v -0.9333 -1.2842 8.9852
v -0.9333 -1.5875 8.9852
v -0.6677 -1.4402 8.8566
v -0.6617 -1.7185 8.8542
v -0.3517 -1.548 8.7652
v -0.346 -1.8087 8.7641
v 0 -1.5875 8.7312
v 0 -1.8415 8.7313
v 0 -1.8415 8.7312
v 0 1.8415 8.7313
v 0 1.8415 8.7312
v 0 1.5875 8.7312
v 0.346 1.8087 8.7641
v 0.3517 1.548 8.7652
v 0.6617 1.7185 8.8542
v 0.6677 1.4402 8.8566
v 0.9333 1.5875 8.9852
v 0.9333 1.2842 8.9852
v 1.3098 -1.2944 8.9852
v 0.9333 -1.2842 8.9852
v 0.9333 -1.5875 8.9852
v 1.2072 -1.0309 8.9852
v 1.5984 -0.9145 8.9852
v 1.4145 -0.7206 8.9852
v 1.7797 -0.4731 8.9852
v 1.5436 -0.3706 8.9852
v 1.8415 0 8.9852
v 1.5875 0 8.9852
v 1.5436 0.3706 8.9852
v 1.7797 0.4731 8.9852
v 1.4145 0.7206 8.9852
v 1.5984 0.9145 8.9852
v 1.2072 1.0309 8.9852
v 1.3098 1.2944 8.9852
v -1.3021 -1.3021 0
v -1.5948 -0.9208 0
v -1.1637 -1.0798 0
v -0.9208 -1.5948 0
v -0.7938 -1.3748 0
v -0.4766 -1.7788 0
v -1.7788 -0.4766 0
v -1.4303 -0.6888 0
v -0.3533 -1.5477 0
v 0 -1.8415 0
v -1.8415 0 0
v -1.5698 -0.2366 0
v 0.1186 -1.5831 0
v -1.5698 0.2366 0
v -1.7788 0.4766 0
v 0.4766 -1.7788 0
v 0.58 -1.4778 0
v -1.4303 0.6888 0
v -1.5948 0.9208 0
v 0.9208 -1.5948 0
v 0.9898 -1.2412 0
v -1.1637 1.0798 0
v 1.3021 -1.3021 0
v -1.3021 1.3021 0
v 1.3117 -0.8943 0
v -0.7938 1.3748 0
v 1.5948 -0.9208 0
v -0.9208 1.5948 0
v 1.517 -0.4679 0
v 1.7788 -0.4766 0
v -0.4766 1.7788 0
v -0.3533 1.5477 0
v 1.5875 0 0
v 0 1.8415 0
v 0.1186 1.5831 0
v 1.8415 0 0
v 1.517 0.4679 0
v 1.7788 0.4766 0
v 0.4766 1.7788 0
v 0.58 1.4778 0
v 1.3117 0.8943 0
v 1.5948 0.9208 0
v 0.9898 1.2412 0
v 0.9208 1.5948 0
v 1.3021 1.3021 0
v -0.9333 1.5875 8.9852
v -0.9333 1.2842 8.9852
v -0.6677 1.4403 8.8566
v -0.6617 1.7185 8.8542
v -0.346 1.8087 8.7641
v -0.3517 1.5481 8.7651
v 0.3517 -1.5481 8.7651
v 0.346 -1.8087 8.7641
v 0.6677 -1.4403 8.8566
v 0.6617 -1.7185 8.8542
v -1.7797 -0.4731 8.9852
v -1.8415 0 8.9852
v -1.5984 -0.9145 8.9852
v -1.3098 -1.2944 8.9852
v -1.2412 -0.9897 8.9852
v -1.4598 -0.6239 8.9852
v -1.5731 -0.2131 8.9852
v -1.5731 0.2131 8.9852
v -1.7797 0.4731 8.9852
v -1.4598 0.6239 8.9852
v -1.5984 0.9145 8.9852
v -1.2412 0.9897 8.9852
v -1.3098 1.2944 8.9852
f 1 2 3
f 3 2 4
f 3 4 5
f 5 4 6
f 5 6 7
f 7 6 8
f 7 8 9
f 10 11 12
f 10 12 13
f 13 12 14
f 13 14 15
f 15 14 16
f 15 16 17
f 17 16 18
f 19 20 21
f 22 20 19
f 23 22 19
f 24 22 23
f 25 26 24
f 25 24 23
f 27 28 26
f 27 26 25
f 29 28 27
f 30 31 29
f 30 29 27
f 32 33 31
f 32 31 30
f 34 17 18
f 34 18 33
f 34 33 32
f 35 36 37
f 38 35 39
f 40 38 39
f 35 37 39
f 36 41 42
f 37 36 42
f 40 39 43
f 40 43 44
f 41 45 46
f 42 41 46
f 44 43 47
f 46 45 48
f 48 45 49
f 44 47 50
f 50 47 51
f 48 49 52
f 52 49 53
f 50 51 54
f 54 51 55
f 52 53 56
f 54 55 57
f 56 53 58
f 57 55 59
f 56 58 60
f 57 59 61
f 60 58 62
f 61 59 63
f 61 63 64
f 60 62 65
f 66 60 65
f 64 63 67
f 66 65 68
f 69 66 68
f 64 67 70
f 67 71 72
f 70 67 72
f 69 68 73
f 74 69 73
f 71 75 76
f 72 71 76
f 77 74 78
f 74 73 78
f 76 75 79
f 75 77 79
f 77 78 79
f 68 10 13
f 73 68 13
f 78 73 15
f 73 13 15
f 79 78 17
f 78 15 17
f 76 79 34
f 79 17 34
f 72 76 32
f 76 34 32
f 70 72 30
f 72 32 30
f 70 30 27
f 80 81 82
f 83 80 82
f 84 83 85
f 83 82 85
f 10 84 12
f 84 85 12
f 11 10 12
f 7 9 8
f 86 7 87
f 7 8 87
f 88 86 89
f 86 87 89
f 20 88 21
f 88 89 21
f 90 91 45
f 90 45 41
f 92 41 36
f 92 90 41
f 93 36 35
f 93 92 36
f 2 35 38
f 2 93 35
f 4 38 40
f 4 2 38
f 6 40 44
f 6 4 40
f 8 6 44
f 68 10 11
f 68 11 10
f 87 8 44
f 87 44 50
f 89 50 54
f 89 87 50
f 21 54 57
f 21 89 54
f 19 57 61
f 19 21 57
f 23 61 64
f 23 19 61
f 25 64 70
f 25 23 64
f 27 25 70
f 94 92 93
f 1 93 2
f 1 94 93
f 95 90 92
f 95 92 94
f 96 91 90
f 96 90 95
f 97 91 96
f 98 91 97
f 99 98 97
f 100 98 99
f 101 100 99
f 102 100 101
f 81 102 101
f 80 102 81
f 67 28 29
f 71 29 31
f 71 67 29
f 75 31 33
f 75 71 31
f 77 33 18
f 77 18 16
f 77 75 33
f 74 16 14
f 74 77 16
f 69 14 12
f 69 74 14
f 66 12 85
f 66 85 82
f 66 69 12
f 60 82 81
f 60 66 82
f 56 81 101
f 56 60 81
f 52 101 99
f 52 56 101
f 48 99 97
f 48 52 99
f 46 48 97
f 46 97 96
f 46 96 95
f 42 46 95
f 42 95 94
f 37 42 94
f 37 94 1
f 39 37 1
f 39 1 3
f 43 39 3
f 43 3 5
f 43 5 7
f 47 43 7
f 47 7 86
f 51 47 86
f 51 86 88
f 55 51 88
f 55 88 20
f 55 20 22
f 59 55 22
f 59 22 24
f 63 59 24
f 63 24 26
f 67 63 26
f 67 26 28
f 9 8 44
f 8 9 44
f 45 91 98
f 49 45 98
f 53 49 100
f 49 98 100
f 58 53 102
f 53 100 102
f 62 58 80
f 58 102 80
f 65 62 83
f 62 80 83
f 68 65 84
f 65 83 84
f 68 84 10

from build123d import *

# Parameters (mm, degrees)
F0_W     = 3.683
F0_H     = 3.683
F0_R     = 1.5875
F1_DEPTH = 8.98525
F3_DEPTH = 3.683
F4_R     = 1.84149


# Not quite as in the source:
# - a fillet or chamfer is up to 0.001 mm smaller than in the source, because OpenCascade refuses the exact size


with BuildPart() as f1:
    # F0 (on Top) → F1 (new body)
    with BuildSketch(Plane.XY):
        Rectangle(F0_W, F0_H)
        Circle(F0_R, mode=Mode.SUBTRACT)
    extrude(amount=F1_DEPTH)

    # F2 (on face) → F3 (cut, through all)
    with BuildSketch(Plane.XZ.offset(1.8415)):
        with BuildLine():
            Line((0, 8.98525), (-0.933255592, 8.98525))
            ThreePointArc((-0.933255592, 8.98525), (-0.4836015922, 8.7958842904), (0, 8.73125))
            Line((0, 8.73125), (0, 8.98525))
        make_face()
        with BuildLine():
            Line((0, 8.98525), (0, 8.73125))
            ThreePointArc((0, 8.73125), (0.4836015922, 8.7958842904), (0.933255592, 8.98525))
            Line((0.933255592, 8.98525), (0, 8.98525))
        make_face()
    extrude(amount=-F3_DEPTH, mode=Mode.SUBTRACT)

    # F4 (radius 1.8415 in the source; OpenCascade refuses exactly that, so slightly less here)
    f4_edges = [f1.edges().sort_by_distance(p)[0] for p in [
        (-1.8415, -1.8415, 4.492625),
        (1.8415, -1.8415, 4.492625),
        (1.8415, 1.8415, 4.492625),
        (-1.8415, 1.8415, 4.492625),
    ]]
    fillet(f4_edges, radius=F4_R)


solid = f1.part
